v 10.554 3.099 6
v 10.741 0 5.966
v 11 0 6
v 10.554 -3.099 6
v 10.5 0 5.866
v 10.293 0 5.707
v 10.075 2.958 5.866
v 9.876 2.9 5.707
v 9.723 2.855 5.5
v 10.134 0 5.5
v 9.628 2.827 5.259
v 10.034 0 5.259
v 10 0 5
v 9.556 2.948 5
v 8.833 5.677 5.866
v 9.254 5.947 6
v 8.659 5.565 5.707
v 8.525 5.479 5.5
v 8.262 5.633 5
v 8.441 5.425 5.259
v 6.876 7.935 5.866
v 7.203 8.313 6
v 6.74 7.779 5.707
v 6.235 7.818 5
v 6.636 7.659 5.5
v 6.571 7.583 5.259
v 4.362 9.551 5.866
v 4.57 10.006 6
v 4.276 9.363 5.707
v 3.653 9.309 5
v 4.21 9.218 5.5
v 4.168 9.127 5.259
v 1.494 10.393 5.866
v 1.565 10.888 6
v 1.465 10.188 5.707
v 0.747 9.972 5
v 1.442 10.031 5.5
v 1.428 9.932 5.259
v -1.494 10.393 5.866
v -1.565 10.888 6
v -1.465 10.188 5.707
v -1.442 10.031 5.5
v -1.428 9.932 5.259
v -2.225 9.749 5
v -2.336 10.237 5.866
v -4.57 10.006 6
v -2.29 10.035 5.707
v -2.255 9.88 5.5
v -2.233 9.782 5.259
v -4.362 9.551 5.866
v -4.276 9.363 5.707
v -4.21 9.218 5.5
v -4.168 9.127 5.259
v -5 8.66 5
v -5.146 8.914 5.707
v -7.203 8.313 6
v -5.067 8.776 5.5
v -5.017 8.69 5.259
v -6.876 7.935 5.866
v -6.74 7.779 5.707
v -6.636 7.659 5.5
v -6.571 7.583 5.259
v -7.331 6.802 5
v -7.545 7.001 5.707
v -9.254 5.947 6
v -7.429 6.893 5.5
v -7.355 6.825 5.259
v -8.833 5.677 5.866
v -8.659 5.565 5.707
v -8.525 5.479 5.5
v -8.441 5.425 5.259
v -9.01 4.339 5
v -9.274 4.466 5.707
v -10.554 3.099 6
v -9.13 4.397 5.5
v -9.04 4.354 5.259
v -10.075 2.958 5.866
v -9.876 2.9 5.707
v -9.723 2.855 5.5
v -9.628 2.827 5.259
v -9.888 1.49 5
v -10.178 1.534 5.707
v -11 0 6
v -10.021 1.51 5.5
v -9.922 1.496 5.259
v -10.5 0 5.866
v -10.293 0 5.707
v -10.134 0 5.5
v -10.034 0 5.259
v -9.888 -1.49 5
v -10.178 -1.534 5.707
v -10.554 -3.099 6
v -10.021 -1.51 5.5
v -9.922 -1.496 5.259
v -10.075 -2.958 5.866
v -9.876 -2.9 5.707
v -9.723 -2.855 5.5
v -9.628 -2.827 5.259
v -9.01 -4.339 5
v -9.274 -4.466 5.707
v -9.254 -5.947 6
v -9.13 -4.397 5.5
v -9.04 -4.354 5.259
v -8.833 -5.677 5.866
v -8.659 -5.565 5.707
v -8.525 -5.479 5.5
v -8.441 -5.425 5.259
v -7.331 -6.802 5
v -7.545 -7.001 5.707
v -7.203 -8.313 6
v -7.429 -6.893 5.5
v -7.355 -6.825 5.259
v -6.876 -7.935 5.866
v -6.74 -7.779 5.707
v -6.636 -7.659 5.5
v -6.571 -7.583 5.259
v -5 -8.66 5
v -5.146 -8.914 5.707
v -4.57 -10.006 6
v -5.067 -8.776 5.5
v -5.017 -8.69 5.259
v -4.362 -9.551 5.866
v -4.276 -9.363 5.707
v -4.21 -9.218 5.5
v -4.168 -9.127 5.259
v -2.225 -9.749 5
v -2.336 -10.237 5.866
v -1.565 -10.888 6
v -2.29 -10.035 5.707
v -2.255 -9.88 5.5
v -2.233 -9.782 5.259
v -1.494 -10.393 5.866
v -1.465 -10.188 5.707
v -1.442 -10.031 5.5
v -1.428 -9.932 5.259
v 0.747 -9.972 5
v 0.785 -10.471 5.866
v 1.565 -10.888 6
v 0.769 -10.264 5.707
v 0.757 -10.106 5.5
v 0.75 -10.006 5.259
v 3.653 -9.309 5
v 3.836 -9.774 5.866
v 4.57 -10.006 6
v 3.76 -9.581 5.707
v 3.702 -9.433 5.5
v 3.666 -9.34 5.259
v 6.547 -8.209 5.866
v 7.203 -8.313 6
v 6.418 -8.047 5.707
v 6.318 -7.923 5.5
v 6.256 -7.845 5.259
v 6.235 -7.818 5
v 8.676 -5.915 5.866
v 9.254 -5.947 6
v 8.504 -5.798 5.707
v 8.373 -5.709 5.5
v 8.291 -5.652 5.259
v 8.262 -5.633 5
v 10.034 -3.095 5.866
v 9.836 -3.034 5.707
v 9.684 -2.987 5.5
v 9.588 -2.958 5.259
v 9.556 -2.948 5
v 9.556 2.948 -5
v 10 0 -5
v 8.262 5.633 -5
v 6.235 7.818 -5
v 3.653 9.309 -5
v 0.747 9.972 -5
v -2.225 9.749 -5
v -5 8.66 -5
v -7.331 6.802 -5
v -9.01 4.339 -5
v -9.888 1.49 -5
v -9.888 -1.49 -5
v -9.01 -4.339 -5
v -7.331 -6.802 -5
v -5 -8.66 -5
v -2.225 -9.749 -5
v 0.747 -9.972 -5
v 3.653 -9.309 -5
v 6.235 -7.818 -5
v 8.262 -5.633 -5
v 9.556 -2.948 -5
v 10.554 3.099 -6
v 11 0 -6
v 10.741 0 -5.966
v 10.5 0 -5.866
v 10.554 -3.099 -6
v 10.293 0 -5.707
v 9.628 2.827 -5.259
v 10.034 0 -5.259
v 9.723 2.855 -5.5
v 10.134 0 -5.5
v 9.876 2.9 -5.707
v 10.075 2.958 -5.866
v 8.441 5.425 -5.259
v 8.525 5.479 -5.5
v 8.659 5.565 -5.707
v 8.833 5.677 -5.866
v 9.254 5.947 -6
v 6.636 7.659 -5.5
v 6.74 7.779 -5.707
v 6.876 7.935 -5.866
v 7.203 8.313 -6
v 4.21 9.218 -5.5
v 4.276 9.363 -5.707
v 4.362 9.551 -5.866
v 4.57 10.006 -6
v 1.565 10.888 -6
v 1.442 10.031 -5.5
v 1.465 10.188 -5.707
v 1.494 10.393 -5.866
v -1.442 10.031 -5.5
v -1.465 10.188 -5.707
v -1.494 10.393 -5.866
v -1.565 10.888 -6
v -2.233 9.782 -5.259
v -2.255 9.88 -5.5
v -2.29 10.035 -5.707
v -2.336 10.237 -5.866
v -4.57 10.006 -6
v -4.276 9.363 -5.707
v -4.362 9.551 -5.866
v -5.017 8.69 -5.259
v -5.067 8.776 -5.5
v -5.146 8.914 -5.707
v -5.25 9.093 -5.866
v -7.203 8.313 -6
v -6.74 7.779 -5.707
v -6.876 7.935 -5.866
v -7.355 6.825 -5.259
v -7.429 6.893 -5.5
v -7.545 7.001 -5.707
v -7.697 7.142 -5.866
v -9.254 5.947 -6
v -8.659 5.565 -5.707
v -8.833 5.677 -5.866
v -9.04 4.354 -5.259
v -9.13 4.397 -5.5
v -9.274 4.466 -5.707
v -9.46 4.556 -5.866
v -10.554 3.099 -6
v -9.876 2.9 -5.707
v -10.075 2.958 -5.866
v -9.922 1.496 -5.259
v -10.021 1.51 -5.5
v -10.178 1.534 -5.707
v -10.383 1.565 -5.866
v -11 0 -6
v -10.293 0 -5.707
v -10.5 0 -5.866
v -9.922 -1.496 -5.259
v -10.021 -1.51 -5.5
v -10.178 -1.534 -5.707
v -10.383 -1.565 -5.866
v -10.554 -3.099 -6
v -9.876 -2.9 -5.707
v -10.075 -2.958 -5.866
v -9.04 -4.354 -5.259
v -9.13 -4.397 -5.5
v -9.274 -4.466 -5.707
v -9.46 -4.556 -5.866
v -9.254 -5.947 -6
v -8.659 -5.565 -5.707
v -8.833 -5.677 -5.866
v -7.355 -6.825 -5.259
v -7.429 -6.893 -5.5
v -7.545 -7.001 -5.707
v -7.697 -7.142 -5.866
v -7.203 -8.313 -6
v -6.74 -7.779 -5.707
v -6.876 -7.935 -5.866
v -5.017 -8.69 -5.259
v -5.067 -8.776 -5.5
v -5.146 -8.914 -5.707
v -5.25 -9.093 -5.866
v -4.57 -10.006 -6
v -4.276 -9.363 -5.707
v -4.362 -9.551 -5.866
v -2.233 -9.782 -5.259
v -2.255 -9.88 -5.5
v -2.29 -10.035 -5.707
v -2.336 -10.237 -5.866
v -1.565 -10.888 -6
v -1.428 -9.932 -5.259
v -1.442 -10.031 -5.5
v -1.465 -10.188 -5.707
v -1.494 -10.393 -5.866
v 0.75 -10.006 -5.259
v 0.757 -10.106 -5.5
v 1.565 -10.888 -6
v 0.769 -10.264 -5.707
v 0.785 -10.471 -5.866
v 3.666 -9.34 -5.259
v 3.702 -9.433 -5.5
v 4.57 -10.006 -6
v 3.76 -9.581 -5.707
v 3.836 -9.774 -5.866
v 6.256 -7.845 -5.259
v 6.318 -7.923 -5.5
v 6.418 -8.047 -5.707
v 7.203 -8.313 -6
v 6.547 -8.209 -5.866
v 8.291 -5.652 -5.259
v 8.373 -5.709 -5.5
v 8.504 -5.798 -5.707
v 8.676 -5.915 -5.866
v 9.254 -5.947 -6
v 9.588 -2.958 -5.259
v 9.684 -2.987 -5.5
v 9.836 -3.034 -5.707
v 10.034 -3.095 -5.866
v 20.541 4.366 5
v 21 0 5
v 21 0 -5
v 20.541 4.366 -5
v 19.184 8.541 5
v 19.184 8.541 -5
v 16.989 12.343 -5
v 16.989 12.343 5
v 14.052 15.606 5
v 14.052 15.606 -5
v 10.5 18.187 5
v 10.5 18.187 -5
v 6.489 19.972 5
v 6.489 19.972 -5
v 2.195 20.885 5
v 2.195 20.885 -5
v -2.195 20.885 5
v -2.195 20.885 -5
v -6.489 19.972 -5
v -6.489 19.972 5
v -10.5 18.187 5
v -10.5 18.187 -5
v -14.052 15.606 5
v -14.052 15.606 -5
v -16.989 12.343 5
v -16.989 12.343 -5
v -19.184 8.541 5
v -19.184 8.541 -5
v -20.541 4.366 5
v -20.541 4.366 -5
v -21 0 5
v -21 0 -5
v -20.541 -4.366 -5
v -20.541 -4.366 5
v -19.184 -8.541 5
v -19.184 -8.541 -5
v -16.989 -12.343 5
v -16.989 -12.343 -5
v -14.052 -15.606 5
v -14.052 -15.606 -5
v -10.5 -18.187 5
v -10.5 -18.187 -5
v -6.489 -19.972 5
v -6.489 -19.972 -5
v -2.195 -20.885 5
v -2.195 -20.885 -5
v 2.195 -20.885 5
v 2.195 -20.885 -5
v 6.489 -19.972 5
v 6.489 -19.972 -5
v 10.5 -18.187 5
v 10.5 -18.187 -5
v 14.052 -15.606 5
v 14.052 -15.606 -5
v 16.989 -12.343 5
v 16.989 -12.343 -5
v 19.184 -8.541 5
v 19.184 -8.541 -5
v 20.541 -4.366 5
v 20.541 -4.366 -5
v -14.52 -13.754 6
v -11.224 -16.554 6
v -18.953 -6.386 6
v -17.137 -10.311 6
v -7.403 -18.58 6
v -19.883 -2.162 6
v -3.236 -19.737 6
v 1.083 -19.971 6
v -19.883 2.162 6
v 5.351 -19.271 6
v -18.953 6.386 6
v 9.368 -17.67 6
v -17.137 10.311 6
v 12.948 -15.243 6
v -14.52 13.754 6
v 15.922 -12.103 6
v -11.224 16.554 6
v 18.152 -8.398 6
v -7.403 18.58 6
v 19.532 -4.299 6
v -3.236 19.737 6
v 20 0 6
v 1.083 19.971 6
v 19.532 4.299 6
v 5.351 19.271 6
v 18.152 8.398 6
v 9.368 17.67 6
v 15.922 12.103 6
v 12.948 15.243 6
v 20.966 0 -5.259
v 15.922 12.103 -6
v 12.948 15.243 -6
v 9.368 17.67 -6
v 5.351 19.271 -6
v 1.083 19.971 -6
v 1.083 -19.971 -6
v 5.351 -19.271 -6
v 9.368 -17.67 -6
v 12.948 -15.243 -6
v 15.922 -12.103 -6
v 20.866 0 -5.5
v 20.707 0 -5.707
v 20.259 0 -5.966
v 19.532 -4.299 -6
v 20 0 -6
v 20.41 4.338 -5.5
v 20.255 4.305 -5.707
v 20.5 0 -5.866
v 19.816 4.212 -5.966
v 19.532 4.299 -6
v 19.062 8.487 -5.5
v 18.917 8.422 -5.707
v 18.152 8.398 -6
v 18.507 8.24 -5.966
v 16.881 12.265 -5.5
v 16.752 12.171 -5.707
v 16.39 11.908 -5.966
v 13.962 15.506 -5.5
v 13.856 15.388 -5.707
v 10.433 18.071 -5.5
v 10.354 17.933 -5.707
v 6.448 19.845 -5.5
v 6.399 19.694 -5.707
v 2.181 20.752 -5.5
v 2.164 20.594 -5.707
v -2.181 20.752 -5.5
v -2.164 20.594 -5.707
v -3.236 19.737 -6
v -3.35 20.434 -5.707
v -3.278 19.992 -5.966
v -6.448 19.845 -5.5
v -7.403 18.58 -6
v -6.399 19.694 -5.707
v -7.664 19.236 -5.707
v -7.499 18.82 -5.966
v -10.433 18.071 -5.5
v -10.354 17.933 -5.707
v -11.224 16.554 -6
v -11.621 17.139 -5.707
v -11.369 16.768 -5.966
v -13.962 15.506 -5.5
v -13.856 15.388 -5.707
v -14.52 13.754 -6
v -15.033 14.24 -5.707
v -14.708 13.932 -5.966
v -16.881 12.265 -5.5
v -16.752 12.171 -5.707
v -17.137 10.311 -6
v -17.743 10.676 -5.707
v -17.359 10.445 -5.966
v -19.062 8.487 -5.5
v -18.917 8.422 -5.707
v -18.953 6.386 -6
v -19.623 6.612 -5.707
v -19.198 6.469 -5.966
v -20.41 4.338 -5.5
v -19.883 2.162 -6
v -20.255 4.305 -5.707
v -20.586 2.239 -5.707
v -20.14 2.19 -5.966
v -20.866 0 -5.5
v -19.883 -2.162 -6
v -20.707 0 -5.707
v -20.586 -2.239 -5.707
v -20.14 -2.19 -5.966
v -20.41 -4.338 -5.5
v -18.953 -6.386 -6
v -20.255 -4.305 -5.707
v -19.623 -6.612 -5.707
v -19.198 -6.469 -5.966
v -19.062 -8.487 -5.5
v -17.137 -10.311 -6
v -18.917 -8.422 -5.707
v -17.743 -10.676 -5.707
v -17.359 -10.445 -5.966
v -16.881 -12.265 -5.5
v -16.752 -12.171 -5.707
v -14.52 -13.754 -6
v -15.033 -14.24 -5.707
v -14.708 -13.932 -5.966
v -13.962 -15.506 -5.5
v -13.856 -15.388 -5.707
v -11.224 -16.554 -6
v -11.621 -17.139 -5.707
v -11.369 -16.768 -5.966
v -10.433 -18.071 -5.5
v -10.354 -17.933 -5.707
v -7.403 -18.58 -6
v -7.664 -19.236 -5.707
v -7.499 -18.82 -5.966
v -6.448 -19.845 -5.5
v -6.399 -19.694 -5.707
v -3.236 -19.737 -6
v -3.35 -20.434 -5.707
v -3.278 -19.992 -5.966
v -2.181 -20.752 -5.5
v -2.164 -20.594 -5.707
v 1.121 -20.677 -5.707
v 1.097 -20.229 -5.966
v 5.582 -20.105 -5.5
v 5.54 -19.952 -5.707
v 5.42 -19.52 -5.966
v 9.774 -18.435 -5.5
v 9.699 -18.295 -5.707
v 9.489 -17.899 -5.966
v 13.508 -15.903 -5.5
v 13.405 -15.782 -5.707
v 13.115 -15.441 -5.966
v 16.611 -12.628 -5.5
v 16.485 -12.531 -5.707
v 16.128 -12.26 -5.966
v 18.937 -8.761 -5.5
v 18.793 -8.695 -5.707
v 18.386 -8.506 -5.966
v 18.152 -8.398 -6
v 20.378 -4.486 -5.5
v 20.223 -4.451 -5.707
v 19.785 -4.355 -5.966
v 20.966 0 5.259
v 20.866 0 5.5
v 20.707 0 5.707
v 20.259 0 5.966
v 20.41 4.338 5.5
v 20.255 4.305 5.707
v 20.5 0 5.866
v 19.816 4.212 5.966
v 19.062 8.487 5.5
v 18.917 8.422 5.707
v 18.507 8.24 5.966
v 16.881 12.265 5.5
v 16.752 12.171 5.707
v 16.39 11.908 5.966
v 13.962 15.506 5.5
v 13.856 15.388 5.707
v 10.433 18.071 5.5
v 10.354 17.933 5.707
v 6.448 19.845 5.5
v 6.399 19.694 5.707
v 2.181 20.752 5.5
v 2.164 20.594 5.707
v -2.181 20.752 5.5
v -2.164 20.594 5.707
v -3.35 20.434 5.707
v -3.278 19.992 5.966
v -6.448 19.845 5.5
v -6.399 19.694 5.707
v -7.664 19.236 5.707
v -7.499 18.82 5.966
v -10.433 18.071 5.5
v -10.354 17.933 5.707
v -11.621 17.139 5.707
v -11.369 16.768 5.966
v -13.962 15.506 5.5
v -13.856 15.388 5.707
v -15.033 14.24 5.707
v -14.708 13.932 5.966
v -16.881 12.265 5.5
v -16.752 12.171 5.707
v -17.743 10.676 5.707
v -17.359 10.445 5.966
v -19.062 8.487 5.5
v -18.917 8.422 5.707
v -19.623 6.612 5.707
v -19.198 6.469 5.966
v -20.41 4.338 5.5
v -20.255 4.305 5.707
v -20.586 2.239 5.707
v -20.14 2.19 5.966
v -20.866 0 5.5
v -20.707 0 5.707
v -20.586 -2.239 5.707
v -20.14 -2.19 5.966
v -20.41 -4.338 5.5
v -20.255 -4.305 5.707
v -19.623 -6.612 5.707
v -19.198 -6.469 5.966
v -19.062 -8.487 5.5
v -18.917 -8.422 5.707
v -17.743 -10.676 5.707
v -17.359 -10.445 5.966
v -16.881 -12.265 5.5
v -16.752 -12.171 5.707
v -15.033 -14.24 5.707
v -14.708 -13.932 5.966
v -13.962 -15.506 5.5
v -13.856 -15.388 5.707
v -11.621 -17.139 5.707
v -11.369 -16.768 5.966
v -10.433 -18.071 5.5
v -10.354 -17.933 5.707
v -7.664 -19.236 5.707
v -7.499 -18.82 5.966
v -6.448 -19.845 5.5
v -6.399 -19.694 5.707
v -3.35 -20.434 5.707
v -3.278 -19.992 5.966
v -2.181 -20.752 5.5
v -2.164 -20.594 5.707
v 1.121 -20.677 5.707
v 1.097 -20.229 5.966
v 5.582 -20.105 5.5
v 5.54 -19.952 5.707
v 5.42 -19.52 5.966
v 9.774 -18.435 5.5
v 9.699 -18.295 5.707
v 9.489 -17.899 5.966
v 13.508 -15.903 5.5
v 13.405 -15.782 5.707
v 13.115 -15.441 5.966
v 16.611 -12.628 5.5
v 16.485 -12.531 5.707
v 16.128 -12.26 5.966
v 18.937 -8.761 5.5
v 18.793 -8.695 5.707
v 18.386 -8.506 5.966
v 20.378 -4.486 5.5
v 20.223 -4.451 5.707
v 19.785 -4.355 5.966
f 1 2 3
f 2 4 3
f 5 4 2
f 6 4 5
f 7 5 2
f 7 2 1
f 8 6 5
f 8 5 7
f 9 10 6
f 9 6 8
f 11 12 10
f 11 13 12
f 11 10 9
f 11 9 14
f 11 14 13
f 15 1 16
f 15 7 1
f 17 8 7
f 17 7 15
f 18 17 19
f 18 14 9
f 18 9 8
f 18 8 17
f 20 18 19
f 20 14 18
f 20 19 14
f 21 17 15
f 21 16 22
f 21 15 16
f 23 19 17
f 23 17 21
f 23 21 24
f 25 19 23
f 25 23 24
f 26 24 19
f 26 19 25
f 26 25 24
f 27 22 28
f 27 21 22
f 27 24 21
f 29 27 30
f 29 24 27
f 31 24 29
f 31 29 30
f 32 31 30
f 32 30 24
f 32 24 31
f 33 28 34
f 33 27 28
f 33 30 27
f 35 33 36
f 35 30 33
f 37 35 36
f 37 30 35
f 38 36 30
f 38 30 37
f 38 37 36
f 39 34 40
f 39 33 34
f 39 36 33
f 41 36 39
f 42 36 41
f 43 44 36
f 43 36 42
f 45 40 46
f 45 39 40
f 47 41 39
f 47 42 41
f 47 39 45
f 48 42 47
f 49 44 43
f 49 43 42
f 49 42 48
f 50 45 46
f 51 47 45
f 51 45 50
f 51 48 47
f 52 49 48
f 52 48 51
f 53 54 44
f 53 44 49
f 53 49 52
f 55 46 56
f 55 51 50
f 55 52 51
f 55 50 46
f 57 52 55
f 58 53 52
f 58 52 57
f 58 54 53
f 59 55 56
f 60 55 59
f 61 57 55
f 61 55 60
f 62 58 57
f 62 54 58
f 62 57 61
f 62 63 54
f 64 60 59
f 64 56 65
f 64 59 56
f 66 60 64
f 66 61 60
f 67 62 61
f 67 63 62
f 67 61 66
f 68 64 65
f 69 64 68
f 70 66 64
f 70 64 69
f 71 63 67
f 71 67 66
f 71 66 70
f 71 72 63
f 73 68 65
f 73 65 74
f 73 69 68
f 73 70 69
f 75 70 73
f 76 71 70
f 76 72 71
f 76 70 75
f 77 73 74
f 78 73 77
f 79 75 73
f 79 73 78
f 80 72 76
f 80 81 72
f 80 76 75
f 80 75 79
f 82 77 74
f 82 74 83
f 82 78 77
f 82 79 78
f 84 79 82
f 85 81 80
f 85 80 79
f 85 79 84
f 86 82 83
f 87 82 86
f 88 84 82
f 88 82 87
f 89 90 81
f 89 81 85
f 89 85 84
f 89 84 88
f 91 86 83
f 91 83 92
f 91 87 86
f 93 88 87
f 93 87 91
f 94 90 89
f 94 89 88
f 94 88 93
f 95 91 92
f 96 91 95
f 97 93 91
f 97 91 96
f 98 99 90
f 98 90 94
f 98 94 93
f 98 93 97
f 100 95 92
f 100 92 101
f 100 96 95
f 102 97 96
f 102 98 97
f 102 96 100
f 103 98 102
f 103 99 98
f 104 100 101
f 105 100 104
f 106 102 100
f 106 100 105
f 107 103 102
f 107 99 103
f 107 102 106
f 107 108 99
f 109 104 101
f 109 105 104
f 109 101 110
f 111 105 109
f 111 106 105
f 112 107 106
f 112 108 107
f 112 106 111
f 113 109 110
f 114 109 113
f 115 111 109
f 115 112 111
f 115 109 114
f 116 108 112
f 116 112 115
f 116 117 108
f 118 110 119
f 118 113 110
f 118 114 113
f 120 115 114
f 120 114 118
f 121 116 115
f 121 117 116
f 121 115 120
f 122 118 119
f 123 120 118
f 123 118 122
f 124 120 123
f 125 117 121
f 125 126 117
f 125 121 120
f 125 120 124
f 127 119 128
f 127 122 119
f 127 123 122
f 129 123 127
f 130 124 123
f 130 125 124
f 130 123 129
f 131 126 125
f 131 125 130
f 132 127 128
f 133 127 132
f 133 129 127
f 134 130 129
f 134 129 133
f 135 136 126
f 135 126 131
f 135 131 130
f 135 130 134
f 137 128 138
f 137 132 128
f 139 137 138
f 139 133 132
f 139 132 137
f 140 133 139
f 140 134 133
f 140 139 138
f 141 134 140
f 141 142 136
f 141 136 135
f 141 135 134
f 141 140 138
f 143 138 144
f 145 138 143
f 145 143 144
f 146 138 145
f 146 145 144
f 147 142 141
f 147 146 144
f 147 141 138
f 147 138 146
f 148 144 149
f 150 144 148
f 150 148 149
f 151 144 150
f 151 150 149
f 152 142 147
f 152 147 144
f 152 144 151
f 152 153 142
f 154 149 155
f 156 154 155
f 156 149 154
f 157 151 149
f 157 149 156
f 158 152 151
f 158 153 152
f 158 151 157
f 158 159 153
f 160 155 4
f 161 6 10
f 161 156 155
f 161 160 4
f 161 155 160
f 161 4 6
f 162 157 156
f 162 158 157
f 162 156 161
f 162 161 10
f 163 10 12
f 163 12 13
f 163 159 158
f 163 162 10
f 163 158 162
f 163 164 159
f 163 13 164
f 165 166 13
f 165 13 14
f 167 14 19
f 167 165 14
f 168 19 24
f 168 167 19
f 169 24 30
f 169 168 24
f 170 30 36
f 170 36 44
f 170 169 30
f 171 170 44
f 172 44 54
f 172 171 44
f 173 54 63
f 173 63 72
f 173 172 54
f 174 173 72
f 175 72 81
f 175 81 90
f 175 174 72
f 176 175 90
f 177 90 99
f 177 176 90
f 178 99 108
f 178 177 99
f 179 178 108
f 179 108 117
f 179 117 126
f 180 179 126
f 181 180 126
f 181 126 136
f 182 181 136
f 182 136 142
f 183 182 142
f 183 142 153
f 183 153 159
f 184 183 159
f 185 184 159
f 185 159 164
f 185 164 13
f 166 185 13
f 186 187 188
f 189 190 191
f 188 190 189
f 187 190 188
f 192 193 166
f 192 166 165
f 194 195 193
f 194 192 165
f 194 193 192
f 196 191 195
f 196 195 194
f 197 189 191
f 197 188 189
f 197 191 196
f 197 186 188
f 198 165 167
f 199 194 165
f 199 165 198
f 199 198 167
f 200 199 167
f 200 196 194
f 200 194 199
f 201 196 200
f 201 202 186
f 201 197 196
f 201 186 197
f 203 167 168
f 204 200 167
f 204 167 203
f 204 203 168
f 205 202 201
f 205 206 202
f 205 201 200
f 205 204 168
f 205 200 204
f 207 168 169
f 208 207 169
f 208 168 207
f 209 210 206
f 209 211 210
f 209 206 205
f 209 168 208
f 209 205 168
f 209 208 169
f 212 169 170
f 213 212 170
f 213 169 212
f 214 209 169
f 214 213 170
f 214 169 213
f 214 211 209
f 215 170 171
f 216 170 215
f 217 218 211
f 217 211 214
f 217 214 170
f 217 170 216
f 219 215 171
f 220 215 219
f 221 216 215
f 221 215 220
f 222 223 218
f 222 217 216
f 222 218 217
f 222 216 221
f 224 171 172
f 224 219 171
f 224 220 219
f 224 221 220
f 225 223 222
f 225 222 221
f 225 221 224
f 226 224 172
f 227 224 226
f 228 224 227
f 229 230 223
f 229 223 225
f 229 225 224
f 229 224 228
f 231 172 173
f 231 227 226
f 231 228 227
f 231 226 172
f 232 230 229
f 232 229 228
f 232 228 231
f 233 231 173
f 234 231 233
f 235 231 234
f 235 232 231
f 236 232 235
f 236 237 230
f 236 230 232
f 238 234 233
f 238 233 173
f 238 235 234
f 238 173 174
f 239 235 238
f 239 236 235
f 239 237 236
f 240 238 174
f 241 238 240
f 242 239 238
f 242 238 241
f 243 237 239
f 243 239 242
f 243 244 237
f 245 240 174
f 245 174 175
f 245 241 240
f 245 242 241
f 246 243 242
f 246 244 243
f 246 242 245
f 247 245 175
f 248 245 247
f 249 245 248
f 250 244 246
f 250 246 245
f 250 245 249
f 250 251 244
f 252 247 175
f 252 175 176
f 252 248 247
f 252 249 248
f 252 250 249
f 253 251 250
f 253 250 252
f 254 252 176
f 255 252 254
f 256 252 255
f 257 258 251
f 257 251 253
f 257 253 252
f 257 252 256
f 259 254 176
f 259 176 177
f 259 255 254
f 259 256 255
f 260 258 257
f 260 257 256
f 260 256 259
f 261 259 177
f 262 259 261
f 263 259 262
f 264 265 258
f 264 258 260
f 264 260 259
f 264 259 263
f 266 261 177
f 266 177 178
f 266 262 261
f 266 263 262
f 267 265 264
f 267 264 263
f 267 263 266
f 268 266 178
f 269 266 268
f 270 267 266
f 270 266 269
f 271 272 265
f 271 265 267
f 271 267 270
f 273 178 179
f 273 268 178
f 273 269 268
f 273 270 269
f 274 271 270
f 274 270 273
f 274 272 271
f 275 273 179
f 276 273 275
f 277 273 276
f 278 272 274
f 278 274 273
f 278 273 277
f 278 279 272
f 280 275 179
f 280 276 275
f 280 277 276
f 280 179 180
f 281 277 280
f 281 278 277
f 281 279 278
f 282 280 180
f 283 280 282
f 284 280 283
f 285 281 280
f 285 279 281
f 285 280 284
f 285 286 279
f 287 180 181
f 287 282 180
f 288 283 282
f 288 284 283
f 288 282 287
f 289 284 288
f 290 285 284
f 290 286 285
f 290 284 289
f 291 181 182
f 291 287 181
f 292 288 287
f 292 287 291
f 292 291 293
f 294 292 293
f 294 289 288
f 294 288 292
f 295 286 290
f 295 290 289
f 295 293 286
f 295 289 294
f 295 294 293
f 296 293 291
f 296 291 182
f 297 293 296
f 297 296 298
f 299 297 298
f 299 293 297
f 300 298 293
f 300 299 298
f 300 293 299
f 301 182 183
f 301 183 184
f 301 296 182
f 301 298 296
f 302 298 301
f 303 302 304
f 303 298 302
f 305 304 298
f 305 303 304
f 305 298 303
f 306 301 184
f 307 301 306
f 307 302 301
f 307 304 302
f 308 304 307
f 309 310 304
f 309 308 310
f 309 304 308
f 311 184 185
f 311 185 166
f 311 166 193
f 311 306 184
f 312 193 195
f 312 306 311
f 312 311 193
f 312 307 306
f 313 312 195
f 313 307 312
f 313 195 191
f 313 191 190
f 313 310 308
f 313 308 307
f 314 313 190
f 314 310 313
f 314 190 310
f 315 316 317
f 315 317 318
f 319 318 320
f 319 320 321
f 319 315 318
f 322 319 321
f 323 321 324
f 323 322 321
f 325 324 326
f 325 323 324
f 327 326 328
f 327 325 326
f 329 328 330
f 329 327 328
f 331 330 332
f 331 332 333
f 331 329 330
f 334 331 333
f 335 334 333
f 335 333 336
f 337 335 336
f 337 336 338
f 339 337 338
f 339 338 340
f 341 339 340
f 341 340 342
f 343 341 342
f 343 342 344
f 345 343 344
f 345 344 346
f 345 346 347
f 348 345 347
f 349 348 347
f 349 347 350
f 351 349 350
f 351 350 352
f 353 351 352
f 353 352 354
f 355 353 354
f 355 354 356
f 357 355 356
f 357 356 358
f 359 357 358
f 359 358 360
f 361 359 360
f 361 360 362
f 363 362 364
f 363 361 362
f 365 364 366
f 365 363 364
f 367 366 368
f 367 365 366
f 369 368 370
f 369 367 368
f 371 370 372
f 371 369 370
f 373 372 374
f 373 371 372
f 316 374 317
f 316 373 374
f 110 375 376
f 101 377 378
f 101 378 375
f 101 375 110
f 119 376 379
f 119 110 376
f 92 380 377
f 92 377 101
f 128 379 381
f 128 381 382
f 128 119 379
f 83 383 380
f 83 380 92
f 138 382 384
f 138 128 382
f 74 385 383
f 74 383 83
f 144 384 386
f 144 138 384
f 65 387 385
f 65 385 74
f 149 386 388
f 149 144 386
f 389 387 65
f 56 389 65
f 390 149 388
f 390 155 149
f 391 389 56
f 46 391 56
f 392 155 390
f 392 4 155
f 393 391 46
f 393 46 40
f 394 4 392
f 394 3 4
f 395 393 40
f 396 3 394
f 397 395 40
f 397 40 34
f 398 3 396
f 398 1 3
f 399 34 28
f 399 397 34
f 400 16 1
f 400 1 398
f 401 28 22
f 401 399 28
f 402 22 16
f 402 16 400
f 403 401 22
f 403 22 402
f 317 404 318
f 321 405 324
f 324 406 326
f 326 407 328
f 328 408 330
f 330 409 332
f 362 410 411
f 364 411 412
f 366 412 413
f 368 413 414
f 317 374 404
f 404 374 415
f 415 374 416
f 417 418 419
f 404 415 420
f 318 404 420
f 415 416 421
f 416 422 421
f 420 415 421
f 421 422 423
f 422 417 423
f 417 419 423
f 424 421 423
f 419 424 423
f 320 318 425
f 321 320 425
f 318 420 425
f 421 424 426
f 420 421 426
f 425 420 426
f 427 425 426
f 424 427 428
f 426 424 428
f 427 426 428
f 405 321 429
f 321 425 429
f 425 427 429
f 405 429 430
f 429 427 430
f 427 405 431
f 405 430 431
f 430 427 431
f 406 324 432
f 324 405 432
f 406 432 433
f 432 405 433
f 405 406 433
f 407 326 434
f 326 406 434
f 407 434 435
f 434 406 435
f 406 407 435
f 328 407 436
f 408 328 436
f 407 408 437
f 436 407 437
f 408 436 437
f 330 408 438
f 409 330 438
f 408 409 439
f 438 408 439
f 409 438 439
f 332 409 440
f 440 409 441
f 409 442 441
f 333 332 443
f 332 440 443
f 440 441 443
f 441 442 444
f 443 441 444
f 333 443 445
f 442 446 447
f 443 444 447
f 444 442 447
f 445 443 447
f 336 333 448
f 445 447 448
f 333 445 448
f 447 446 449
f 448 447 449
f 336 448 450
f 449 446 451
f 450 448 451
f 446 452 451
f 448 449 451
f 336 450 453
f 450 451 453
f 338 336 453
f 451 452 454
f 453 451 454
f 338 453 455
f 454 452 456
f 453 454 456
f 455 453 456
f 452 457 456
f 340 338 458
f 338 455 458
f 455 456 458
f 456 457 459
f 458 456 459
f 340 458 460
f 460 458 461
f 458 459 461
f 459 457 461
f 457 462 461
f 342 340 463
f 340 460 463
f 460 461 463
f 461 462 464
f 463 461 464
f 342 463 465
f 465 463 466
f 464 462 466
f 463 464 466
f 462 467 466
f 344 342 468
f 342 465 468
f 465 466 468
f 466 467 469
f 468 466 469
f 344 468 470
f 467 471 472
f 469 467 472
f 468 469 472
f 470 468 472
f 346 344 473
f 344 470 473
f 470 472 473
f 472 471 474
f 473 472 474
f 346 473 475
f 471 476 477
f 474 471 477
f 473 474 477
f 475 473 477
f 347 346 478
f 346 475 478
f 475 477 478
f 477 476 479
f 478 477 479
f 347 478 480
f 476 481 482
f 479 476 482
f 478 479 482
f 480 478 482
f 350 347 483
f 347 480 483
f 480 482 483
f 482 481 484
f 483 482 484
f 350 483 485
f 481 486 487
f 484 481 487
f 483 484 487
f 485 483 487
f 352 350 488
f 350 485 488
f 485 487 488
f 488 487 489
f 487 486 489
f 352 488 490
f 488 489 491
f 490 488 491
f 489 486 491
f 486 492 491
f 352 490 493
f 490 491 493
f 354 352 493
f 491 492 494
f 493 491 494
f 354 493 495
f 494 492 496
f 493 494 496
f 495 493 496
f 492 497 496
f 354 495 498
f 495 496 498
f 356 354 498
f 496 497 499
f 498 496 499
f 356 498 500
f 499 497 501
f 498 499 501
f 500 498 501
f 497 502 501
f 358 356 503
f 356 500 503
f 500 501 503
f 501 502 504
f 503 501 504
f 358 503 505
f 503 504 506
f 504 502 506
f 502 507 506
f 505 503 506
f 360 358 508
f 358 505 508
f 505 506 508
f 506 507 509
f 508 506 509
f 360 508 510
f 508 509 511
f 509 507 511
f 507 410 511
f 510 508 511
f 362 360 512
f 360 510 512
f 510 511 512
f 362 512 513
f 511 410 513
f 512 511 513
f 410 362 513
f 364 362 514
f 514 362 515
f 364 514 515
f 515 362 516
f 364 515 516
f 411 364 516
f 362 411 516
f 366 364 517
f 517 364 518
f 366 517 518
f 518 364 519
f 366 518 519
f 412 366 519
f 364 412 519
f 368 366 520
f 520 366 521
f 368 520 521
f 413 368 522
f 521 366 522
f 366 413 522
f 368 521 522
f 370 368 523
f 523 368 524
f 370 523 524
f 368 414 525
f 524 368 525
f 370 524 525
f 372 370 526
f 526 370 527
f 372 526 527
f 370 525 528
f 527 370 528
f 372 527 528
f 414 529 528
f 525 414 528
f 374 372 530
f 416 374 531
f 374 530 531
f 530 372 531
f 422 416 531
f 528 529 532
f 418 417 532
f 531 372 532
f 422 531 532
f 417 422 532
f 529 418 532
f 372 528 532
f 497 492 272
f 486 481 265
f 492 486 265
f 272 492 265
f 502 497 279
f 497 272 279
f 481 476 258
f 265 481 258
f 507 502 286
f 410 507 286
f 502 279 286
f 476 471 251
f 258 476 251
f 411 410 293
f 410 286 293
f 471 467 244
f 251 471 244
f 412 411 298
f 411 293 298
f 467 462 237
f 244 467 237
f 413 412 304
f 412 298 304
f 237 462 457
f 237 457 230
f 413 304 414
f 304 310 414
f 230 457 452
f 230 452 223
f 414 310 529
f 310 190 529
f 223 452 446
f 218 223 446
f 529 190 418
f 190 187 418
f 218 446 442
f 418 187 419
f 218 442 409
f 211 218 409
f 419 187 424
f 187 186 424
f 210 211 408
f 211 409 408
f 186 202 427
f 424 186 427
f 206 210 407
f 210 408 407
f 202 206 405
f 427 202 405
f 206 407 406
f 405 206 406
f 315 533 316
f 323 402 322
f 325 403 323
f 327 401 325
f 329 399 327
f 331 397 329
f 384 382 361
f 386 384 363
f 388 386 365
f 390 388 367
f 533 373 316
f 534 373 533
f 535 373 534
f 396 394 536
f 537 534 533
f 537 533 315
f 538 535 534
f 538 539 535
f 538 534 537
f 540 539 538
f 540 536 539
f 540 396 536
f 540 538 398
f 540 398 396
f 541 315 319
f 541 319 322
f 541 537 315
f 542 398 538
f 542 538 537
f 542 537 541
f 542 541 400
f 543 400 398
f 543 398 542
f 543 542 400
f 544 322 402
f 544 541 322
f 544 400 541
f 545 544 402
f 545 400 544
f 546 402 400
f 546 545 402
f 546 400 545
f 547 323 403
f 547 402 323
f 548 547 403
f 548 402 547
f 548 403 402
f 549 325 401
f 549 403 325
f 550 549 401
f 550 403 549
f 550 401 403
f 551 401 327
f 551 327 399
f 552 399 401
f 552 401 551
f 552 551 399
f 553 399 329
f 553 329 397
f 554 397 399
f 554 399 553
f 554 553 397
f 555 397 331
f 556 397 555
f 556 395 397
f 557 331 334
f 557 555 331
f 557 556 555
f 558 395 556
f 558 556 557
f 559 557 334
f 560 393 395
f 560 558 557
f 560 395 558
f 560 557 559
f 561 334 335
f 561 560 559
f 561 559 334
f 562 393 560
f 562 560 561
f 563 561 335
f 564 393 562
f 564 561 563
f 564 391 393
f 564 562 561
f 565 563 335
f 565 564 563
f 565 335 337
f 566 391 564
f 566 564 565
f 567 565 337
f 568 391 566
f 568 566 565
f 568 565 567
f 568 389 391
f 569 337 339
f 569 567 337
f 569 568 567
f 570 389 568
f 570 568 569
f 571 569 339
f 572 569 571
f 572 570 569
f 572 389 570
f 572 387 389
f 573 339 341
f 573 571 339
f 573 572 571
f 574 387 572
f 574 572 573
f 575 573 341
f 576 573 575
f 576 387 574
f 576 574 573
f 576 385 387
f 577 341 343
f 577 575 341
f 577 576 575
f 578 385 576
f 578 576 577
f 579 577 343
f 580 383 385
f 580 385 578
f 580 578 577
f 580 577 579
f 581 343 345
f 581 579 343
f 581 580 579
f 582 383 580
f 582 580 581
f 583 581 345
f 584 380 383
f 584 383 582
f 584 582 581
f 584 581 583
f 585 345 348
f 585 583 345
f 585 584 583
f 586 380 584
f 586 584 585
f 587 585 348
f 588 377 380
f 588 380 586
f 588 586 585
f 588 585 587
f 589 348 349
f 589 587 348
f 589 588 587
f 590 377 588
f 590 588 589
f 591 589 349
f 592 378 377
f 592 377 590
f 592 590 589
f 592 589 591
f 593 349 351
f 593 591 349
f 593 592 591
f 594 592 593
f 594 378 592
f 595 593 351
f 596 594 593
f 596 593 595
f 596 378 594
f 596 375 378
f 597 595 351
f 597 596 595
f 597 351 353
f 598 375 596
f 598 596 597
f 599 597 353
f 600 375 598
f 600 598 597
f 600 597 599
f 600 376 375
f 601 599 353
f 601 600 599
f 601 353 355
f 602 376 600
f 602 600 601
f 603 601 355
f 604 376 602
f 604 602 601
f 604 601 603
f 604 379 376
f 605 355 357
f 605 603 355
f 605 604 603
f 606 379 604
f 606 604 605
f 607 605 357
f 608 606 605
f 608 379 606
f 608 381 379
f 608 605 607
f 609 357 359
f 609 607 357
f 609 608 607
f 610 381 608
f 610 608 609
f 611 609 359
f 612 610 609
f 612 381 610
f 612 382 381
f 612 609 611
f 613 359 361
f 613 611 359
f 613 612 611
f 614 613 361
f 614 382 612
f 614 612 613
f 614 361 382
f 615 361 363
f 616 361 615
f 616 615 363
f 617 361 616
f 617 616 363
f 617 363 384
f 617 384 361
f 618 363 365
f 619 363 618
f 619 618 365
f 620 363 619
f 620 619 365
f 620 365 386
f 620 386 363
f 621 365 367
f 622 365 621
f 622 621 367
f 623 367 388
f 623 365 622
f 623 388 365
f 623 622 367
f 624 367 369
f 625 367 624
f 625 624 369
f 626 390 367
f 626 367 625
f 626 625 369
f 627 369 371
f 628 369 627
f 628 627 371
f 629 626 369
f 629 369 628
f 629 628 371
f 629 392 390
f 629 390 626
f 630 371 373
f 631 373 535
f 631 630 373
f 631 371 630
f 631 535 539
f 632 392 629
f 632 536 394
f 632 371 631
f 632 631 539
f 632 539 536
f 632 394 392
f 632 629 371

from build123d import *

# Parameters (mm, degrees)
BEARING_DIMENSIONS_R   = 21
BEARING_DIMENSIONS_R_2 = 10
BEARING_EXTRUDE_DEPTH  = 6
FILLET1_R              = 1


with BuildPart() as part:
    # Bearing Dimensions → Bearing Extrude (new, symmetric)
    with BuildSketch(Plane.XY):
        Circle(BEARING_DIMENSIONS_R)
        Circle(BEARING_DIMENSIONS_R_2, mode=Mode.SUBTRACT)
    extrude(amount=BEARING_EXTRUDE_DEPTH, both=True)

    # Fillet1
    fillet1_edges = [part.edges().sort_by_distance(p)[0] for p in [
        (-21, 0, -6),
        (-21, 0, 6),
        (-10, 0, -6),
        (-10, 0, 6),
    ]]
    fillet(fillet1_edges, radius=FILLET1_R)


solid = part.part
